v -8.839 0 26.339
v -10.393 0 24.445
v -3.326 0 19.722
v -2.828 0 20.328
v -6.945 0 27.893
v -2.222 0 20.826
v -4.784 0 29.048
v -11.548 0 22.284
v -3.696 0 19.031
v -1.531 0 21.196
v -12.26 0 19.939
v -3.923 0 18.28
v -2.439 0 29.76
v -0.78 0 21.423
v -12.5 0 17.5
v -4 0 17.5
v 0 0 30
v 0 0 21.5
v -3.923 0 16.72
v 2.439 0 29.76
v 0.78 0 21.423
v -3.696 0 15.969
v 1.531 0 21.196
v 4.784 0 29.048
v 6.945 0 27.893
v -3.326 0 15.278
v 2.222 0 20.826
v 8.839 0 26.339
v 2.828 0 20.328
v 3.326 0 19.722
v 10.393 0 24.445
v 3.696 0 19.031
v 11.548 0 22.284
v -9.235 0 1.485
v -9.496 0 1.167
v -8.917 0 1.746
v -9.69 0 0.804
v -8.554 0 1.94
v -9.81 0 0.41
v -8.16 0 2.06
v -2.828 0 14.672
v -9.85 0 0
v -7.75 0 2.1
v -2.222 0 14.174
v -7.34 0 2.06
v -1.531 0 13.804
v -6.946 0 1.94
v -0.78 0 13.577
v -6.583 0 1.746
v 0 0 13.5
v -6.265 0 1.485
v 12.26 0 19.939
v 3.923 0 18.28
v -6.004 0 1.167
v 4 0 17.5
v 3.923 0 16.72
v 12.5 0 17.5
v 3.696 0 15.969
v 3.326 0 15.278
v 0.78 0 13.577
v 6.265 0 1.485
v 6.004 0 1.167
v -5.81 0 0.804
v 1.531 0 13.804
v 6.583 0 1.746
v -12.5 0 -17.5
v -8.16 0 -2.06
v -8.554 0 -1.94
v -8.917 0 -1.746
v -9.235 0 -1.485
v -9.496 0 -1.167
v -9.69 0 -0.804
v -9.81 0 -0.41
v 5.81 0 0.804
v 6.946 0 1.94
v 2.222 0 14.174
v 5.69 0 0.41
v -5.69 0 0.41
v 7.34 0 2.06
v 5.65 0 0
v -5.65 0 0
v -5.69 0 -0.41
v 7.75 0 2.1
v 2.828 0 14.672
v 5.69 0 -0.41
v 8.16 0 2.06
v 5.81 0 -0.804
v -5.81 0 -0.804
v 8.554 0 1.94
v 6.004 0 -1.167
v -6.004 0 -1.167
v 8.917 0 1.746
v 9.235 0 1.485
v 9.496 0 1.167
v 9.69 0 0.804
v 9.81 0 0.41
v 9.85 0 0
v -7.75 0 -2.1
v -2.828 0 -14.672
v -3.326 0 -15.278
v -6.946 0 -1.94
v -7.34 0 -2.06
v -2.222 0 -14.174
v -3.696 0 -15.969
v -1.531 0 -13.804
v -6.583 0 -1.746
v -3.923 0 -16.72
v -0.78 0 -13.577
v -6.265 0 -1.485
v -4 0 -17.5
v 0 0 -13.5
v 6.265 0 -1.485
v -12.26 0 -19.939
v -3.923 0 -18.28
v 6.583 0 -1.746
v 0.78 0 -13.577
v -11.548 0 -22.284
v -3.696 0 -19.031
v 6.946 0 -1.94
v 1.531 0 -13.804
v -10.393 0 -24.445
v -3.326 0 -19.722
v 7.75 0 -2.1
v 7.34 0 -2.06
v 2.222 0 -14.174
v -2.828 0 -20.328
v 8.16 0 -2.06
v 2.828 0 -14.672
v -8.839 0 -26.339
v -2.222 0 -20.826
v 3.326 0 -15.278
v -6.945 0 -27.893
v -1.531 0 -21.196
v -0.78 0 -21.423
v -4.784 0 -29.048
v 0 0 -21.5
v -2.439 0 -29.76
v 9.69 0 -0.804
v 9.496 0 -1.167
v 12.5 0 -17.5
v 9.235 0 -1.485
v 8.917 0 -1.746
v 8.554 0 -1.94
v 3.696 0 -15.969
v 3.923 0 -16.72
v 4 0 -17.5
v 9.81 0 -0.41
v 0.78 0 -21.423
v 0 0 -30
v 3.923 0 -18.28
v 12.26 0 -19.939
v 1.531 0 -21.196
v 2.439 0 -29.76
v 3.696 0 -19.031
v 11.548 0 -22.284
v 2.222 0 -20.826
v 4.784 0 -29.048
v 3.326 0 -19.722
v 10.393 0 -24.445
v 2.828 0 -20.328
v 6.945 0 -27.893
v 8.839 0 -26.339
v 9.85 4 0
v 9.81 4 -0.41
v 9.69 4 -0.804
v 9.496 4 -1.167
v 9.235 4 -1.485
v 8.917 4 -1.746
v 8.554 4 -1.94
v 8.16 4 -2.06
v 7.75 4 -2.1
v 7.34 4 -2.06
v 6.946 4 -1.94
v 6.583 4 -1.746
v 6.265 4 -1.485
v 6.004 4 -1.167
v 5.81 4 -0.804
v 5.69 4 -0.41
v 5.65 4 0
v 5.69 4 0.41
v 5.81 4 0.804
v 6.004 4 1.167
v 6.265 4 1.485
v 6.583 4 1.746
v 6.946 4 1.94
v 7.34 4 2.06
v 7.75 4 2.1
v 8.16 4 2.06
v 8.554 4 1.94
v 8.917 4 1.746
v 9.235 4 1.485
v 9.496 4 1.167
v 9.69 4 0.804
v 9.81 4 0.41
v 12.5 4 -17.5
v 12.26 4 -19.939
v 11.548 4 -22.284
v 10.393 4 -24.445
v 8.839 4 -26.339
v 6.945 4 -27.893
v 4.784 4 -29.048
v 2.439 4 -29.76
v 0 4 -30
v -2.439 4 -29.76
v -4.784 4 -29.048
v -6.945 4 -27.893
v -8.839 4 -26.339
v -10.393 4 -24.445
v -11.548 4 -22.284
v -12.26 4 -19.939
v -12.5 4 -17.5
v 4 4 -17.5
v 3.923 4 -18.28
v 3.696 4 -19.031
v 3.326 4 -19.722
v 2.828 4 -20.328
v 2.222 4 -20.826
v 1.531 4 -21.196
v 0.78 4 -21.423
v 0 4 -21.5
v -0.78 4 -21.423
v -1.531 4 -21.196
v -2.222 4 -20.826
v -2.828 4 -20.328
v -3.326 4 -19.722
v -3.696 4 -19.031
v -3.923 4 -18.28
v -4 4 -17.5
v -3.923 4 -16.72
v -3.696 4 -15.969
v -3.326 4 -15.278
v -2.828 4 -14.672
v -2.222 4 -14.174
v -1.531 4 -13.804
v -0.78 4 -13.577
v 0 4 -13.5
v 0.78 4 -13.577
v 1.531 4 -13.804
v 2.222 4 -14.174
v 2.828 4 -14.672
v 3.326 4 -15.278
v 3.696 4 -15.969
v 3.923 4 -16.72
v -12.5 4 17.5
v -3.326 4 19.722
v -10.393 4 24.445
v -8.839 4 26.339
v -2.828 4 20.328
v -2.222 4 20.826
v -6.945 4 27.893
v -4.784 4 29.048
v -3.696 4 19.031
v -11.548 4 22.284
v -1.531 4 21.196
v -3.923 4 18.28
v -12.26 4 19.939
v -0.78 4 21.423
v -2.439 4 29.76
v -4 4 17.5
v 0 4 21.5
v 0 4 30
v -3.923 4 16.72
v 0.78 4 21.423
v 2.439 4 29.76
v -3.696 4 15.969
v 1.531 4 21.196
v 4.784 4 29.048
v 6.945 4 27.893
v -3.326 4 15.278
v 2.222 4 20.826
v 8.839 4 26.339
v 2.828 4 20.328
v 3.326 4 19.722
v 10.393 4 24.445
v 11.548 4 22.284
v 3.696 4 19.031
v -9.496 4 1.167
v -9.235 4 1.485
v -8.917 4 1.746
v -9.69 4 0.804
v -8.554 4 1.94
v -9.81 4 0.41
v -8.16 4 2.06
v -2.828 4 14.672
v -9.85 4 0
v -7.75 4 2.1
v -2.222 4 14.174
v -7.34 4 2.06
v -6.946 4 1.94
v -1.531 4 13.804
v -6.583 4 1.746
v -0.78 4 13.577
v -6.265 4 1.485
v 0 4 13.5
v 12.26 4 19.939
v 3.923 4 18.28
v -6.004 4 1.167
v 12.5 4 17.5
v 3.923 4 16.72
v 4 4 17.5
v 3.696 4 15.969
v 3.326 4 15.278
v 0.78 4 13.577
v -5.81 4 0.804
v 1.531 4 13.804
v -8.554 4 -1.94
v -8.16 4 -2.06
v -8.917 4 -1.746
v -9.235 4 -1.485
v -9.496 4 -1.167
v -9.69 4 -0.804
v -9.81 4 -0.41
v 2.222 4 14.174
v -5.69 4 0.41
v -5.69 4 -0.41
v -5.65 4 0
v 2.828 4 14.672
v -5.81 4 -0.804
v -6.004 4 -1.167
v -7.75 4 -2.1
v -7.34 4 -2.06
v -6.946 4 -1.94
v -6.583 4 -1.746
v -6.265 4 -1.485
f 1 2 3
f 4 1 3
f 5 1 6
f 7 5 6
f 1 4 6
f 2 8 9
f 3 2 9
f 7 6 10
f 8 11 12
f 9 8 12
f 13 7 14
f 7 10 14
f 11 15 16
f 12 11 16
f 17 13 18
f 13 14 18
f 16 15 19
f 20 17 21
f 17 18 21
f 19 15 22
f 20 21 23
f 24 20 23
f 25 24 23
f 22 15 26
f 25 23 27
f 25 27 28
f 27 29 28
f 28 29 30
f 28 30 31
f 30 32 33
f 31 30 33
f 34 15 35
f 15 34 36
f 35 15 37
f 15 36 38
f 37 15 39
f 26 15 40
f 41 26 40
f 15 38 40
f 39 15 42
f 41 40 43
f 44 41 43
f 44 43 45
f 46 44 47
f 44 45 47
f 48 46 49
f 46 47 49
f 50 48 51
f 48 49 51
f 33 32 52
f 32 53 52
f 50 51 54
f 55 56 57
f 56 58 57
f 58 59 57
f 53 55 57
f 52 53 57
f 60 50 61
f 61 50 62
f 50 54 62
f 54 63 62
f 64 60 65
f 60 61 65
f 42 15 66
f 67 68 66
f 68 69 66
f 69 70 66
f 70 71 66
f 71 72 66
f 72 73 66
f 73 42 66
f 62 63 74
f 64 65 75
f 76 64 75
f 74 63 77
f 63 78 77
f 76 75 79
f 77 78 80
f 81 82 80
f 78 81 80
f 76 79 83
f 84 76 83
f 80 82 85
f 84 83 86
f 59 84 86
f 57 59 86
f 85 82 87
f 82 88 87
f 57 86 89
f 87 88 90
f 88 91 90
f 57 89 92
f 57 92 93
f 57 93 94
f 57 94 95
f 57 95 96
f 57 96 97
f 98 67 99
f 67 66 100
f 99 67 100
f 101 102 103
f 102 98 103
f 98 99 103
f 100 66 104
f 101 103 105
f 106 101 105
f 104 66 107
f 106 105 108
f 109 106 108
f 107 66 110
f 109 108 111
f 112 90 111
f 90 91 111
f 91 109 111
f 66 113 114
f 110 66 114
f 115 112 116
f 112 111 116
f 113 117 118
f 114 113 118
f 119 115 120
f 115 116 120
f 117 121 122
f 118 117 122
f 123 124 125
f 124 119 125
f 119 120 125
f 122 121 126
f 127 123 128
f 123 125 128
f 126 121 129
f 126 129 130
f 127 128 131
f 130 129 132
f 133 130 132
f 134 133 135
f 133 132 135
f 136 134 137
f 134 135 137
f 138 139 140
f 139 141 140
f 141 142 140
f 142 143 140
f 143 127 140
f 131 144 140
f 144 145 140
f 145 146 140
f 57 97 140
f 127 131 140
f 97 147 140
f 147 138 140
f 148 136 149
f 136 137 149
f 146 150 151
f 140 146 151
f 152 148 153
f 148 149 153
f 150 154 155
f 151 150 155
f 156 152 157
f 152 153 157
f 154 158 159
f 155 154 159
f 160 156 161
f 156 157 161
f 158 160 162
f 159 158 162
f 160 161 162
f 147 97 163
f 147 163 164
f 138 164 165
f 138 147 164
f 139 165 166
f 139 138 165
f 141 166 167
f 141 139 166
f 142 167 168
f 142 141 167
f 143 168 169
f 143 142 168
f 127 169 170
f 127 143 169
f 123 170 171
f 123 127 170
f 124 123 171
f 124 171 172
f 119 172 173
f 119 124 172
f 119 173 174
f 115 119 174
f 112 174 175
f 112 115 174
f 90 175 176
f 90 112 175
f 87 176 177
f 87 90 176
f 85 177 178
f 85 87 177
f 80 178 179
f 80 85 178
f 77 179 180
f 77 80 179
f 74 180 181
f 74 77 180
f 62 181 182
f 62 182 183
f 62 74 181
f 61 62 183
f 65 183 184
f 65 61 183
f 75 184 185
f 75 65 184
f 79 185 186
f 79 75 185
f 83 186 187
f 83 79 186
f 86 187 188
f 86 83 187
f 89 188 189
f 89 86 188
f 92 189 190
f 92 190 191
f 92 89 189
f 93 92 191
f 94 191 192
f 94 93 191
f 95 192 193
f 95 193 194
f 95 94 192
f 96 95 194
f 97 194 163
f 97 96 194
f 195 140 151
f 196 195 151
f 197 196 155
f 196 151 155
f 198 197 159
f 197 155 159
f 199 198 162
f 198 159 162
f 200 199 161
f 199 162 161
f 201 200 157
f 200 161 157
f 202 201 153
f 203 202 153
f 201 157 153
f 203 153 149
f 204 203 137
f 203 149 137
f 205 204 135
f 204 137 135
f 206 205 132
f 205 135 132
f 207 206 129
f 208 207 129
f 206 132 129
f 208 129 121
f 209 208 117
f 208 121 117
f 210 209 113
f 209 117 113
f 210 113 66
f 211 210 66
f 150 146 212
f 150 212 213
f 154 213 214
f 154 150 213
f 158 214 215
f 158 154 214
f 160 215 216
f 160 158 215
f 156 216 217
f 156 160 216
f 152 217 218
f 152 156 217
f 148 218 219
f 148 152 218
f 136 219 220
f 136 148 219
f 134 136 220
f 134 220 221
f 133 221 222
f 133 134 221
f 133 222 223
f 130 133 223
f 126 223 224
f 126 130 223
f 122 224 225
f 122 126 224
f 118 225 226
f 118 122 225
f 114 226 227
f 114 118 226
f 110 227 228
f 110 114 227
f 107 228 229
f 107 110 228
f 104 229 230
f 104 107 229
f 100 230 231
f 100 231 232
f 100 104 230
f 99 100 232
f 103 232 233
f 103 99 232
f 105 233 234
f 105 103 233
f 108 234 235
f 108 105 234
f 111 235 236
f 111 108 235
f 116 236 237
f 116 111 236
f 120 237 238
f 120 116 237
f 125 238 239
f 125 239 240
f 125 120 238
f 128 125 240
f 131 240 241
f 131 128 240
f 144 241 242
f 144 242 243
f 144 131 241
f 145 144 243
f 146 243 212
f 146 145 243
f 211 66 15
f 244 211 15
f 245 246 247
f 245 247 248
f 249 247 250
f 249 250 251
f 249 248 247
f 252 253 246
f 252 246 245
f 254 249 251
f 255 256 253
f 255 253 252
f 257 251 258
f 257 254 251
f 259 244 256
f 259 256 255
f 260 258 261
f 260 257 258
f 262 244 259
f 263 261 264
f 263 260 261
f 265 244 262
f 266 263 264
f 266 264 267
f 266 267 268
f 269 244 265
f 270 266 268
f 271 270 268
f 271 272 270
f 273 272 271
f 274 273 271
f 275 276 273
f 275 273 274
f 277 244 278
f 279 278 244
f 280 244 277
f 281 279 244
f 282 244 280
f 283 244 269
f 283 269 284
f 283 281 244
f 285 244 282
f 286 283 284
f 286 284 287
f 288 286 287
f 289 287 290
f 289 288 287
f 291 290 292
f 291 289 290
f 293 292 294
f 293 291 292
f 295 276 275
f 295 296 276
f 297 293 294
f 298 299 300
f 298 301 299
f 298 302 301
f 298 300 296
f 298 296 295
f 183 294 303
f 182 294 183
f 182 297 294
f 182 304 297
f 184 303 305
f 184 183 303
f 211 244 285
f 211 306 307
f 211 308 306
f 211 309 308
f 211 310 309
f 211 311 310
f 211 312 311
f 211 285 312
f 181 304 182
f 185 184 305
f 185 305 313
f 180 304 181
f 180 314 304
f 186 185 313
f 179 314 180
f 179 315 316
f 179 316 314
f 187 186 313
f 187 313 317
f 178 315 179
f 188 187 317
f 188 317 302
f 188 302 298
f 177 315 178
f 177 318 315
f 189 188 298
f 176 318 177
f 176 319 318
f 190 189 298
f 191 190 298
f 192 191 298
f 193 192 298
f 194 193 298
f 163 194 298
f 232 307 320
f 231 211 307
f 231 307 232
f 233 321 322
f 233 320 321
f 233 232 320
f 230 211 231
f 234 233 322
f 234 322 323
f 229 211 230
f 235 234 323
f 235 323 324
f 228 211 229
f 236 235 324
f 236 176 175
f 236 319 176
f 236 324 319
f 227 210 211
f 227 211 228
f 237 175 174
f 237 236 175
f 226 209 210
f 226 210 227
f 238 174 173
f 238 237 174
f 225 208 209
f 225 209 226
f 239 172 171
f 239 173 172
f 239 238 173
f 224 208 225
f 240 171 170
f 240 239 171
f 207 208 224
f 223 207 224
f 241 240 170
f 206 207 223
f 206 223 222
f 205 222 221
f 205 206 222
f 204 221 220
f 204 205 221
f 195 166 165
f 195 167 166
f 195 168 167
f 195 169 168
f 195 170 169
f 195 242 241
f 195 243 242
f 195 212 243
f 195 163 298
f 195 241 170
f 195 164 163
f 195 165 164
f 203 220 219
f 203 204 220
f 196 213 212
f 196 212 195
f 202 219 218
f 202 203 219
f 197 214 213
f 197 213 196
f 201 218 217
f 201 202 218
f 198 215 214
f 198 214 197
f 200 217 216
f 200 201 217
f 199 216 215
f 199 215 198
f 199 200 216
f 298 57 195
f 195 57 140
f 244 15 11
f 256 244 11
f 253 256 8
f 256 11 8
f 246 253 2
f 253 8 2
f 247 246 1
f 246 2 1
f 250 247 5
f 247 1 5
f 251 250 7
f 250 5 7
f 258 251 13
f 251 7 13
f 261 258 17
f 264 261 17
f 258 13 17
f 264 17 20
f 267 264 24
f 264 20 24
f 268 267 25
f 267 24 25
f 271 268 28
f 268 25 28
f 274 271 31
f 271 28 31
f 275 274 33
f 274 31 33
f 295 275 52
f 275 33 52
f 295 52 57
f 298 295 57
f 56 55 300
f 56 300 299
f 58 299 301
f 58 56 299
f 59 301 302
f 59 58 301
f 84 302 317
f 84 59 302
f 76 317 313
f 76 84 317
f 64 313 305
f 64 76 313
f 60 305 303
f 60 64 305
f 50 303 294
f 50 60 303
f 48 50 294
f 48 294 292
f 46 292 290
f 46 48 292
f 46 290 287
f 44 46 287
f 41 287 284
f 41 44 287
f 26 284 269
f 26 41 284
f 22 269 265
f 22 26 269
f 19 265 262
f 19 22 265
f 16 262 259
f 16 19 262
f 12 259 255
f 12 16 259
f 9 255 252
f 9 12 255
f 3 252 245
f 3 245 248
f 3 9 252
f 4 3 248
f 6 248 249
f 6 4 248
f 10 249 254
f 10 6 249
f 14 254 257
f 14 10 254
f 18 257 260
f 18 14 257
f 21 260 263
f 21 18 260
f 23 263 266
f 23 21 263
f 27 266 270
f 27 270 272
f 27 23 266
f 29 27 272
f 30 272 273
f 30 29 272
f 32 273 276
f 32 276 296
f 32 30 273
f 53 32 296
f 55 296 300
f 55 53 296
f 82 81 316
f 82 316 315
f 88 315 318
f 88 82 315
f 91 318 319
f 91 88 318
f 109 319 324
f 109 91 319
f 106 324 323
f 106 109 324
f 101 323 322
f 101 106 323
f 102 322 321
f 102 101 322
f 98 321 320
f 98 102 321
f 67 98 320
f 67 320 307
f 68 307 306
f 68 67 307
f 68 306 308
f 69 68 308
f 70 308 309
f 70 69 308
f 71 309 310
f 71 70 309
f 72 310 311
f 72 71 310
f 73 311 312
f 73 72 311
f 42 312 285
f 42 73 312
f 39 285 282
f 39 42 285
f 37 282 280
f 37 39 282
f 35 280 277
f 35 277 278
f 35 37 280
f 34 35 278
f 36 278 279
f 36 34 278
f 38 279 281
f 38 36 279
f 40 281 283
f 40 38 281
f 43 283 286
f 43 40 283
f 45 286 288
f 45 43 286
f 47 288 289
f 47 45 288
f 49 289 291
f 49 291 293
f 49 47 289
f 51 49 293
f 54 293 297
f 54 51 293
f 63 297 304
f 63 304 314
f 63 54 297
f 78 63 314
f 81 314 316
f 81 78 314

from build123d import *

# Parameters (mm, degrees)
SKETCH1_R           = 12.5
SKETCH1_R_2         = 4
SKETCH1_R_3         = 2.1
BOSS_EXTRUDE1_DEPTH = 4


with BuildPart() as part:
    # Sketch1 → Boss-Extrude1 (new body)
    with BuildSketch(Plane(origin=(0, 0, 0), x_dir=(1, 0, 0), z_dir=(0, 1, 0))):
        with Locations((0, 17.5)):
            Circle(SKETCH1_R)
        with Locations((0, 17.5)):
            Circle(SKETCH1_R_2, mode=Mode.SUBTRACT)
        with BuildLine():
            ThreePointArc((-12.5, -17.5), (0, -5), (12.5, -17.5))
            Line((12.5, -17.5), (12.5, 17.5))
            ThreePointArc((12.5, 17.5), (-1.8e-08, 5), (-12.5, 17.500000037))
            Line((-12.5, 17.500000037), (-12.5, -17.5))
        make_face()
        with Locations((-7.75, 0)):
            Circle(SKETCH1_R_3, mode=Mode.SUBTRACT)
        with Locations((7.75, 0)):
            Circle(SKETCH1_R_3, mode=Mode.SUBTRACT)
        with Locations((0, -17.5)):
            Circle(SKETCH1_R)
        with Locations((0, -17.5)):
            Circle(SKETCH1_R_2, mode=Mode.SUBTRACT)
    extrude(amount=BOSS_EXTRUDE1_DEPTH)


solid = part.part
